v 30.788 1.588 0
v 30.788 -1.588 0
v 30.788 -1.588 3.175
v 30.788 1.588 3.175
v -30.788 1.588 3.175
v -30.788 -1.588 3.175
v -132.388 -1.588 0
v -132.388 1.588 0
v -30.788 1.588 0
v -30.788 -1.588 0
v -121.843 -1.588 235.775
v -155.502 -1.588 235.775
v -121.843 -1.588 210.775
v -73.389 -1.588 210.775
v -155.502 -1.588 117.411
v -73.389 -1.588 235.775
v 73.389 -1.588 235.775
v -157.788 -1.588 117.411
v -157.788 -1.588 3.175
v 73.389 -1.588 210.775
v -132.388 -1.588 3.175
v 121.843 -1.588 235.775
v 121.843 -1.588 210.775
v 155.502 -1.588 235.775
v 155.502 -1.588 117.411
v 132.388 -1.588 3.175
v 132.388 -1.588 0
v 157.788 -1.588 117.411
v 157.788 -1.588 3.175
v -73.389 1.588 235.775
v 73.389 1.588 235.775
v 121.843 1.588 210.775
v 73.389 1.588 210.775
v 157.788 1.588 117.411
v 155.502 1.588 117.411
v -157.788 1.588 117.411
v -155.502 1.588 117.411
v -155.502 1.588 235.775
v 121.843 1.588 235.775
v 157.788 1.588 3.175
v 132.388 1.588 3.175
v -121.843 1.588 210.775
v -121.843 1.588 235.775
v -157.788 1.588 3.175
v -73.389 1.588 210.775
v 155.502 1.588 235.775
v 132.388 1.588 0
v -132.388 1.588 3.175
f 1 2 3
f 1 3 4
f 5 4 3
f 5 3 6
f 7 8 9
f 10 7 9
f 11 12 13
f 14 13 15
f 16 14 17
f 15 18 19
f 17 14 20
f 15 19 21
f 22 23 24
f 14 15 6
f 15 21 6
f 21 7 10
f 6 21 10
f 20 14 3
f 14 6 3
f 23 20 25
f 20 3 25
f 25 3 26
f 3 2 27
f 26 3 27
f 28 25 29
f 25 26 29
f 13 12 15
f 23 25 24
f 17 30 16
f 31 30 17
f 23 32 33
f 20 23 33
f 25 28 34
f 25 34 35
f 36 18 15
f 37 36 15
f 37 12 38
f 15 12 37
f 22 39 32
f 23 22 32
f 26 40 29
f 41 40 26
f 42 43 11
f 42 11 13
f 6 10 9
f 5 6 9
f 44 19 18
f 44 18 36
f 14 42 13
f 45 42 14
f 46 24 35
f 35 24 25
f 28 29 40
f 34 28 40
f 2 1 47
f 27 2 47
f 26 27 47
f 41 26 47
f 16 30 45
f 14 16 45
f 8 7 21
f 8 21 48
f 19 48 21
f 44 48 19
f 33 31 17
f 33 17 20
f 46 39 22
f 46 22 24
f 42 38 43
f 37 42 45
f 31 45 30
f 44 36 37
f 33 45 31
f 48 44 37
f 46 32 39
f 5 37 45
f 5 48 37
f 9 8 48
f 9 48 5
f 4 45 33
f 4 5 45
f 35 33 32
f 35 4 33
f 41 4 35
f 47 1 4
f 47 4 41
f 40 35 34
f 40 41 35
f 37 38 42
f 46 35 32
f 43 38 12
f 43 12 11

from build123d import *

# Parameters (mm, degrees)
SKETCH1_W           = 315.575
SKETCH1_H           = 3.175
BOSS_EXTRUDE1_DEPTH = 235.775
SKETCH3_W           = 25.4
SKETCH3_H           = 3.175
SKETCH3_W_2         = 61.575
CUT_EXTRUDE1_DEPTH  = 3.175
CUT_EXTRUDE2_START  = -3.175
SKETCH5_W           = 2.286
SKETCH5_H           = 118.364
CUT_EXTRUDE2_DEPTH  = 287.894626403
SKETCH6_W           = 48.454093678
SKETCH6_H           = 25
CUT_EXTRUDE4_DEPTH  = 284.719626403


with BuildPart() as part:
    # Sketch1 → Boss-Extrude1 (new body)
    with BuildSketch(Plane.XY):
        Rectangle(SKETCH1_W, SKETCH1_H)
    extrude(amount=BOSS_EXTRUDE1_DEPTH)

    # Sketch3 → Cut-Extrude1 (cut)
    with BuildSketch(Plane(origin=(0, 0, 0), x_dir=(-1, 0, 0), z_dir=(0, 0, -1))):
        with Locations((-145.0875, 0)):
            Rectangle(SKETCH3_W, SKETCH3_H)
        Rectangle(SKETCH3_W_2, SKETCH3_H)
        with Locations((145.0875, 0)):
            Rectangle(SKETCH3_W, SKETCH3_H)
    extrude(amount=-CUT_EXTRUDE1_DEPTH, mode=Mode.SUBTRACT)

    # Sketch5 → Cut-Extrude2 (cut)
    with BuildSketch(Plane(origin=(0, 1.5875, 0), x_dir=(1, 0, 0), z_dir=(0, 1, 0)).offset(CUT_EXTRUDE2_START)):
        with Locations((-156.6445, -176.593)):
            Rectangle(SKETCH5_W, SKETCH5_H)
    cut_extrude2 = extrude(amount=CUT_EXTRUDE2_DEPTH, mode=Mode.SUBTRACT)

    # Mirror1: Cut-Extrude2 across plane
    add(cut_extrude2.mirror(Plane(origin=(0, 0, 0), x_dir=(0, 0, 1), z_dir=(1, 0, 0))), mode=Mode.SUBTRACT)

    # Sketch6 → Cut-Extrude4 (cut, through all)
    with BuildSketch(Plane(origin=(0, 1.5875, 0), x_dir=(1, 0, 0), z_dir=(0, 1, 0))):
        with Locations((-97.616032964, -223.275)):
            Rectangle(SKETCH6_W, SKETCH6_H)
    cut_extrude4 = extrude(amount=-CUT_EXTRUDE4_DEPTH, mode=Mode.SUBTRACT)

    # Mirror2: Cut-Extrude4 across plane
    add(cut_extrude4.mirror(Plane(origin=(0, 0, 0), x_dir=(0, 0, 1), z_dir=(1, 0, 0))), mode=Mode.SUBTRACT)


solid = part.part
